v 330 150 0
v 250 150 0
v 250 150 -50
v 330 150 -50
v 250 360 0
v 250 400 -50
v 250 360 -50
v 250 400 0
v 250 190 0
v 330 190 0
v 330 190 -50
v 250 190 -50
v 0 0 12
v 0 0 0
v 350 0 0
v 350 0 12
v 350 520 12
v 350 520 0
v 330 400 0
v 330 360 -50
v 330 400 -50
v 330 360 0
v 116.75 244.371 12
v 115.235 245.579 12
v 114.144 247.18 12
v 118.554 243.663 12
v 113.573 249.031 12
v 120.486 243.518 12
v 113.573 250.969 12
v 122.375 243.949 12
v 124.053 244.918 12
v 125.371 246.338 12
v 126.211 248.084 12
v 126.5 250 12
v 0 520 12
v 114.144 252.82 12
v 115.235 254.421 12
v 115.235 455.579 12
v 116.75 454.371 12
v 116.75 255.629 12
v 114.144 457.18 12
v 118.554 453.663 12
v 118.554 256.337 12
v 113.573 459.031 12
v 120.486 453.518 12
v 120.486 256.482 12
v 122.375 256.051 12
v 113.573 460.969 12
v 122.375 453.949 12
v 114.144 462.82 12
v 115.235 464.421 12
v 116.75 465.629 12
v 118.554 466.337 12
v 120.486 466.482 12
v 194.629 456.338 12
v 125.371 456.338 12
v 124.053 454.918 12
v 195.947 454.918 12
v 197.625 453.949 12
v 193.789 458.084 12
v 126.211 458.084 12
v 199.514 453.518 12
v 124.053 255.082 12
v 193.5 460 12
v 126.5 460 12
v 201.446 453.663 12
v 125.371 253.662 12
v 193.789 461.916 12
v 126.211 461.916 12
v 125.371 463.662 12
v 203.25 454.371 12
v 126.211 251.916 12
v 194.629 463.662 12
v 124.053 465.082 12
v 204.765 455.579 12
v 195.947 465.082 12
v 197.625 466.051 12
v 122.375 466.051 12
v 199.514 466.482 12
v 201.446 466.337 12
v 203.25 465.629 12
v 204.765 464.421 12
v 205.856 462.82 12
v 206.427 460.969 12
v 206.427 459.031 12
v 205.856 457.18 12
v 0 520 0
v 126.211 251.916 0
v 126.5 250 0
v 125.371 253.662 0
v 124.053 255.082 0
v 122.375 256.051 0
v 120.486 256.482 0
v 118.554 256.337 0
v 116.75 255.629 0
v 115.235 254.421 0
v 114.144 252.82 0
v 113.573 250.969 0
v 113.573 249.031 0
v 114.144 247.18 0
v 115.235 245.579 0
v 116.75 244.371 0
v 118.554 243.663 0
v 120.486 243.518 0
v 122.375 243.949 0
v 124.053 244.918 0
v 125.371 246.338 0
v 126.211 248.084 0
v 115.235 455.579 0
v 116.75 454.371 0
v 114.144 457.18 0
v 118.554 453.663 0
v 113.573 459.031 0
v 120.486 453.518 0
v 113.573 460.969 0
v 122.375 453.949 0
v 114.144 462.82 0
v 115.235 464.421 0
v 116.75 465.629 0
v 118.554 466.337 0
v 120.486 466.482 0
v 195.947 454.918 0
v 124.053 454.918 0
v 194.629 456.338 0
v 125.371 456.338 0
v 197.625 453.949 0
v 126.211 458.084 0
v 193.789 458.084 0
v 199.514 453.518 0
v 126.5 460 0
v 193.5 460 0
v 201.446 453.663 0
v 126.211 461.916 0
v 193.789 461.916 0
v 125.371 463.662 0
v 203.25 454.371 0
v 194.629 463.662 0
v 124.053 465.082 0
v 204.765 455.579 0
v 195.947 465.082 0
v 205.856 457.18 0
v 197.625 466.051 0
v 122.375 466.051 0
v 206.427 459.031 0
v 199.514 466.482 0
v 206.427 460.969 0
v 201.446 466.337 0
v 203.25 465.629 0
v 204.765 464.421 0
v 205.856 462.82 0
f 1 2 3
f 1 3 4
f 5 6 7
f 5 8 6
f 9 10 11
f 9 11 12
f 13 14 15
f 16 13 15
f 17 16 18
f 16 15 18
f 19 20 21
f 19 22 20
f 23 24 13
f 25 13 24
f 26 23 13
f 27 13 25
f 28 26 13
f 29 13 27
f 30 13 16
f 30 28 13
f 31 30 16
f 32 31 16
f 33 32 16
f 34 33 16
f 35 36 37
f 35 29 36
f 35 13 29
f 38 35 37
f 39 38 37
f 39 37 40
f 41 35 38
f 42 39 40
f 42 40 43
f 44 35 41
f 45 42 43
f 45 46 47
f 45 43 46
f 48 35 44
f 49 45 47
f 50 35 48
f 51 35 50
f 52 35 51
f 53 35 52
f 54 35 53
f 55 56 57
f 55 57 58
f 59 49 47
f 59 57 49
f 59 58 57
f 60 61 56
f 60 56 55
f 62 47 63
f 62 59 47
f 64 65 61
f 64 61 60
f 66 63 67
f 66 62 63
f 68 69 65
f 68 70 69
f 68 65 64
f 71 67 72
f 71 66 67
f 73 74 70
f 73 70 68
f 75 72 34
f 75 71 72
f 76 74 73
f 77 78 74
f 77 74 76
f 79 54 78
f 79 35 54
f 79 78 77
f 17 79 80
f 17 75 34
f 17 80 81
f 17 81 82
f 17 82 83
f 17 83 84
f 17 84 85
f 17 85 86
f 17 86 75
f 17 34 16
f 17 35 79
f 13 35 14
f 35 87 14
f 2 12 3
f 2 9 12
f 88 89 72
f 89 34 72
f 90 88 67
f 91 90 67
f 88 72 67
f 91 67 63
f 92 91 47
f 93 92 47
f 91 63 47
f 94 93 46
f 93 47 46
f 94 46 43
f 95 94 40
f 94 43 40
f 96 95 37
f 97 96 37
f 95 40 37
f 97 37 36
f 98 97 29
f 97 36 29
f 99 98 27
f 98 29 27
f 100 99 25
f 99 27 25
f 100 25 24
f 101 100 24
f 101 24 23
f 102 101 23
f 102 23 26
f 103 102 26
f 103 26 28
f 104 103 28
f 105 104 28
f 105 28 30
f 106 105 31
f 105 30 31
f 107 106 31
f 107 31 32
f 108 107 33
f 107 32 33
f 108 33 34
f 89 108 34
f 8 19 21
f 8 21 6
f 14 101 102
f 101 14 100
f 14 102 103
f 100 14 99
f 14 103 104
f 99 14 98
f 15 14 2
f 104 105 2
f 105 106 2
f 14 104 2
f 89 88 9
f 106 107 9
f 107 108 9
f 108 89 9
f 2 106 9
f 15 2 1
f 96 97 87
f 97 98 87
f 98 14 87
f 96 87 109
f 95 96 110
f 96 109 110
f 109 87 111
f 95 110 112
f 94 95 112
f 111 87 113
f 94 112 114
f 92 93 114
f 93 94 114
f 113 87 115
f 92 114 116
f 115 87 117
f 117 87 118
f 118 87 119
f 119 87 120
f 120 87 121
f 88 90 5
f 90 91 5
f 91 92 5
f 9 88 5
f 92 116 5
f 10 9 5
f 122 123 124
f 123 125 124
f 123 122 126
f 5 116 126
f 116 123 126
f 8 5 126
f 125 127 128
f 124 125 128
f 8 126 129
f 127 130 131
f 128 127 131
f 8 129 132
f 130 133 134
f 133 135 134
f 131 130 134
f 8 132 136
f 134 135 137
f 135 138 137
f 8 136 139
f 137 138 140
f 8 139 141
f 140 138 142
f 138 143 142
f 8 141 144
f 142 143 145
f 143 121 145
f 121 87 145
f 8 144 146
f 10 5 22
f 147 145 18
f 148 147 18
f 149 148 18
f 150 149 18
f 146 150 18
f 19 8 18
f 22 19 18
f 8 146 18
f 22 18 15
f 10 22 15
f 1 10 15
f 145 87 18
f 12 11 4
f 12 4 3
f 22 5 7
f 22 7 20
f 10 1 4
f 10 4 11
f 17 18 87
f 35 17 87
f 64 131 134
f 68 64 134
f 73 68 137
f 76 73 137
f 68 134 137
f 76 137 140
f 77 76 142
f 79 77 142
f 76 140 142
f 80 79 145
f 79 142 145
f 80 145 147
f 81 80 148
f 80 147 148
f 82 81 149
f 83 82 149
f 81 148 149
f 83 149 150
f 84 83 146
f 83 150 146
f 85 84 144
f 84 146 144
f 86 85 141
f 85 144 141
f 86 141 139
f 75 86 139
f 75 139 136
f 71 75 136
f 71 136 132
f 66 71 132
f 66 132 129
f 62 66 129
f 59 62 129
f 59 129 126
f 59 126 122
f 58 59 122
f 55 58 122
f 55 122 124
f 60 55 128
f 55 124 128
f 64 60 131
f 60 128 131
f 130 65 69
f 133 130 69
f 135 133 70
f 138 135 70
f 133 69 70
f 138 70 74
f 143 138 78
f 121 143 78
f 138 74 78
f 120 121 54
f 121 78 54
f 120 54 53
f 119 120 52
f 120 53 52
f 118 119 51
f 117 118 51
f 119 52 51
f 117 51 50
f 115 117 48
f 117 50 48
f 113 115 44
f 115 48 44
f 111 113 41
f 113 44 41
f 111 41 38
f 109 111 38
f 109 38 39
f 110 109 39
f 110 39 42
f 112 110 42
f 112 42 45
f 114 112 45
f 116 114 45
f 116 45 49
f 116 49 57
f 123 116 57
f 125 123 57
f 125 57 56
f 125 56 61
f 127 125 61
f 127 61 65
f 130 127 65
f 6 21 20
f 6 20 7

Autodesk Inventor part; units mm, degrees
ref_plane "YZ Plane" through (0, 0, 0) normal (1, 0, 0) x (0, 1, 0)
ref_plane "XZ Plane" through (0, 0, 0) normal (0, 1, 0) x (-1, 0, 0)
ref_plane "XY Plane" through (0, 0, 0) normal (0, 0, 1) x (1, 0, 0)
sketch "Sketch1" plane through (0, 0, 0) normal (0, 0, 1) x (1, 0, 0)
  line L0 (0, 0) -> (350, 0)
  line L1 (350, 0) -> (350, 520)
  line L2 (350, 520) -> (0, 520)
  line L3 (0, 520) -> (0, 0)
  dimension "d0" = 350
  dimension "d1" = 520
extrude "Extrusion1" add sketch "Sketch1" along normal blind 12
sketch "Sketch2" plane through (0, 0, 12) normal (0, 0, 1) x (1, 0, 0)
  line L0 (0, 120) -> (350, 120)
  line L1 (350, 120) -> (350, 370)
  line L2 (350, 0) -> (350, 520) projected
  line L3 (350, 370) -> (0, 370)
  line L4 (0, 520) -> (0, 0) projected
  line L5 (0, 370) -> (0, 520)
  line L6 (350, 520) -> (0, 520) projected
  line L7 (0, 520) -> (350, 520)
  line L8 (350, 520) -> (350, 370)
  circle A0 centre (120, 460) radius 6.5
  circle A1 centre (120, 250) radius 6.5
  dimension "d6" = 13
  dimension "d7" = 13
extrude "Extrusion2" cut sketch "Sketch2" against normal blind 12 contours A0 | A1
thread "Thread1" size "M14x2" class "6H" standard "ANSI Metric M Profile" full length
thread "Thread2" size "M14x2" class "6H" standard "ANSI Metric M Profile" full length
sketch "Sketch3" plane through (0, 0, 0) normal (0, 0, -1) x (-1, 0, 0)
  circle A0 centre (-200, 460) radius 6.5
  point P0 (0, 0)
  dimension "d14" = 13
extrude "Extrusion3" cut sketch "Sketch3" against normal blind 120
sketch "Sketch4" plane through (0, 0, 12) normal (0, 0, 1) x (1, 0, 0)
  point P0 (0, 0)
sketch "Sketch5" plane through (0, 0, 0) normal (0, 0, -1) x (-1, 0, 0)
  point P0 (0, 0)
sketch "Sketch6" plane through (0, 0, 0) normal (0, 0, -1) x (-1, 0, 0)
  line L0 (-330, 400) -> (-250, 400)
  line L1 (-250, 400) -> (-250, 360)
  line L2 (-250, 360) -> (-330, 360)
  line L3 (-330, 360) -> (-330, 400)
  line L4 (-330, 190) -> (-250, 190)
  line L5 (-250, 190) -> (-250, 150)
  line L6 (-250, 150) -> (-330, 150)
  line L7 (-330, 150) -> (-330, 190)
  point P0 (0, 0)
  dimension "d17" = 80
  dimension "d18" = 40
  dimension "d19" = 80
  dimension "d20" = 40
extrude "Extrusion4" add sketch "Sketch6" along normal blind 50
properties part number "back plate"
